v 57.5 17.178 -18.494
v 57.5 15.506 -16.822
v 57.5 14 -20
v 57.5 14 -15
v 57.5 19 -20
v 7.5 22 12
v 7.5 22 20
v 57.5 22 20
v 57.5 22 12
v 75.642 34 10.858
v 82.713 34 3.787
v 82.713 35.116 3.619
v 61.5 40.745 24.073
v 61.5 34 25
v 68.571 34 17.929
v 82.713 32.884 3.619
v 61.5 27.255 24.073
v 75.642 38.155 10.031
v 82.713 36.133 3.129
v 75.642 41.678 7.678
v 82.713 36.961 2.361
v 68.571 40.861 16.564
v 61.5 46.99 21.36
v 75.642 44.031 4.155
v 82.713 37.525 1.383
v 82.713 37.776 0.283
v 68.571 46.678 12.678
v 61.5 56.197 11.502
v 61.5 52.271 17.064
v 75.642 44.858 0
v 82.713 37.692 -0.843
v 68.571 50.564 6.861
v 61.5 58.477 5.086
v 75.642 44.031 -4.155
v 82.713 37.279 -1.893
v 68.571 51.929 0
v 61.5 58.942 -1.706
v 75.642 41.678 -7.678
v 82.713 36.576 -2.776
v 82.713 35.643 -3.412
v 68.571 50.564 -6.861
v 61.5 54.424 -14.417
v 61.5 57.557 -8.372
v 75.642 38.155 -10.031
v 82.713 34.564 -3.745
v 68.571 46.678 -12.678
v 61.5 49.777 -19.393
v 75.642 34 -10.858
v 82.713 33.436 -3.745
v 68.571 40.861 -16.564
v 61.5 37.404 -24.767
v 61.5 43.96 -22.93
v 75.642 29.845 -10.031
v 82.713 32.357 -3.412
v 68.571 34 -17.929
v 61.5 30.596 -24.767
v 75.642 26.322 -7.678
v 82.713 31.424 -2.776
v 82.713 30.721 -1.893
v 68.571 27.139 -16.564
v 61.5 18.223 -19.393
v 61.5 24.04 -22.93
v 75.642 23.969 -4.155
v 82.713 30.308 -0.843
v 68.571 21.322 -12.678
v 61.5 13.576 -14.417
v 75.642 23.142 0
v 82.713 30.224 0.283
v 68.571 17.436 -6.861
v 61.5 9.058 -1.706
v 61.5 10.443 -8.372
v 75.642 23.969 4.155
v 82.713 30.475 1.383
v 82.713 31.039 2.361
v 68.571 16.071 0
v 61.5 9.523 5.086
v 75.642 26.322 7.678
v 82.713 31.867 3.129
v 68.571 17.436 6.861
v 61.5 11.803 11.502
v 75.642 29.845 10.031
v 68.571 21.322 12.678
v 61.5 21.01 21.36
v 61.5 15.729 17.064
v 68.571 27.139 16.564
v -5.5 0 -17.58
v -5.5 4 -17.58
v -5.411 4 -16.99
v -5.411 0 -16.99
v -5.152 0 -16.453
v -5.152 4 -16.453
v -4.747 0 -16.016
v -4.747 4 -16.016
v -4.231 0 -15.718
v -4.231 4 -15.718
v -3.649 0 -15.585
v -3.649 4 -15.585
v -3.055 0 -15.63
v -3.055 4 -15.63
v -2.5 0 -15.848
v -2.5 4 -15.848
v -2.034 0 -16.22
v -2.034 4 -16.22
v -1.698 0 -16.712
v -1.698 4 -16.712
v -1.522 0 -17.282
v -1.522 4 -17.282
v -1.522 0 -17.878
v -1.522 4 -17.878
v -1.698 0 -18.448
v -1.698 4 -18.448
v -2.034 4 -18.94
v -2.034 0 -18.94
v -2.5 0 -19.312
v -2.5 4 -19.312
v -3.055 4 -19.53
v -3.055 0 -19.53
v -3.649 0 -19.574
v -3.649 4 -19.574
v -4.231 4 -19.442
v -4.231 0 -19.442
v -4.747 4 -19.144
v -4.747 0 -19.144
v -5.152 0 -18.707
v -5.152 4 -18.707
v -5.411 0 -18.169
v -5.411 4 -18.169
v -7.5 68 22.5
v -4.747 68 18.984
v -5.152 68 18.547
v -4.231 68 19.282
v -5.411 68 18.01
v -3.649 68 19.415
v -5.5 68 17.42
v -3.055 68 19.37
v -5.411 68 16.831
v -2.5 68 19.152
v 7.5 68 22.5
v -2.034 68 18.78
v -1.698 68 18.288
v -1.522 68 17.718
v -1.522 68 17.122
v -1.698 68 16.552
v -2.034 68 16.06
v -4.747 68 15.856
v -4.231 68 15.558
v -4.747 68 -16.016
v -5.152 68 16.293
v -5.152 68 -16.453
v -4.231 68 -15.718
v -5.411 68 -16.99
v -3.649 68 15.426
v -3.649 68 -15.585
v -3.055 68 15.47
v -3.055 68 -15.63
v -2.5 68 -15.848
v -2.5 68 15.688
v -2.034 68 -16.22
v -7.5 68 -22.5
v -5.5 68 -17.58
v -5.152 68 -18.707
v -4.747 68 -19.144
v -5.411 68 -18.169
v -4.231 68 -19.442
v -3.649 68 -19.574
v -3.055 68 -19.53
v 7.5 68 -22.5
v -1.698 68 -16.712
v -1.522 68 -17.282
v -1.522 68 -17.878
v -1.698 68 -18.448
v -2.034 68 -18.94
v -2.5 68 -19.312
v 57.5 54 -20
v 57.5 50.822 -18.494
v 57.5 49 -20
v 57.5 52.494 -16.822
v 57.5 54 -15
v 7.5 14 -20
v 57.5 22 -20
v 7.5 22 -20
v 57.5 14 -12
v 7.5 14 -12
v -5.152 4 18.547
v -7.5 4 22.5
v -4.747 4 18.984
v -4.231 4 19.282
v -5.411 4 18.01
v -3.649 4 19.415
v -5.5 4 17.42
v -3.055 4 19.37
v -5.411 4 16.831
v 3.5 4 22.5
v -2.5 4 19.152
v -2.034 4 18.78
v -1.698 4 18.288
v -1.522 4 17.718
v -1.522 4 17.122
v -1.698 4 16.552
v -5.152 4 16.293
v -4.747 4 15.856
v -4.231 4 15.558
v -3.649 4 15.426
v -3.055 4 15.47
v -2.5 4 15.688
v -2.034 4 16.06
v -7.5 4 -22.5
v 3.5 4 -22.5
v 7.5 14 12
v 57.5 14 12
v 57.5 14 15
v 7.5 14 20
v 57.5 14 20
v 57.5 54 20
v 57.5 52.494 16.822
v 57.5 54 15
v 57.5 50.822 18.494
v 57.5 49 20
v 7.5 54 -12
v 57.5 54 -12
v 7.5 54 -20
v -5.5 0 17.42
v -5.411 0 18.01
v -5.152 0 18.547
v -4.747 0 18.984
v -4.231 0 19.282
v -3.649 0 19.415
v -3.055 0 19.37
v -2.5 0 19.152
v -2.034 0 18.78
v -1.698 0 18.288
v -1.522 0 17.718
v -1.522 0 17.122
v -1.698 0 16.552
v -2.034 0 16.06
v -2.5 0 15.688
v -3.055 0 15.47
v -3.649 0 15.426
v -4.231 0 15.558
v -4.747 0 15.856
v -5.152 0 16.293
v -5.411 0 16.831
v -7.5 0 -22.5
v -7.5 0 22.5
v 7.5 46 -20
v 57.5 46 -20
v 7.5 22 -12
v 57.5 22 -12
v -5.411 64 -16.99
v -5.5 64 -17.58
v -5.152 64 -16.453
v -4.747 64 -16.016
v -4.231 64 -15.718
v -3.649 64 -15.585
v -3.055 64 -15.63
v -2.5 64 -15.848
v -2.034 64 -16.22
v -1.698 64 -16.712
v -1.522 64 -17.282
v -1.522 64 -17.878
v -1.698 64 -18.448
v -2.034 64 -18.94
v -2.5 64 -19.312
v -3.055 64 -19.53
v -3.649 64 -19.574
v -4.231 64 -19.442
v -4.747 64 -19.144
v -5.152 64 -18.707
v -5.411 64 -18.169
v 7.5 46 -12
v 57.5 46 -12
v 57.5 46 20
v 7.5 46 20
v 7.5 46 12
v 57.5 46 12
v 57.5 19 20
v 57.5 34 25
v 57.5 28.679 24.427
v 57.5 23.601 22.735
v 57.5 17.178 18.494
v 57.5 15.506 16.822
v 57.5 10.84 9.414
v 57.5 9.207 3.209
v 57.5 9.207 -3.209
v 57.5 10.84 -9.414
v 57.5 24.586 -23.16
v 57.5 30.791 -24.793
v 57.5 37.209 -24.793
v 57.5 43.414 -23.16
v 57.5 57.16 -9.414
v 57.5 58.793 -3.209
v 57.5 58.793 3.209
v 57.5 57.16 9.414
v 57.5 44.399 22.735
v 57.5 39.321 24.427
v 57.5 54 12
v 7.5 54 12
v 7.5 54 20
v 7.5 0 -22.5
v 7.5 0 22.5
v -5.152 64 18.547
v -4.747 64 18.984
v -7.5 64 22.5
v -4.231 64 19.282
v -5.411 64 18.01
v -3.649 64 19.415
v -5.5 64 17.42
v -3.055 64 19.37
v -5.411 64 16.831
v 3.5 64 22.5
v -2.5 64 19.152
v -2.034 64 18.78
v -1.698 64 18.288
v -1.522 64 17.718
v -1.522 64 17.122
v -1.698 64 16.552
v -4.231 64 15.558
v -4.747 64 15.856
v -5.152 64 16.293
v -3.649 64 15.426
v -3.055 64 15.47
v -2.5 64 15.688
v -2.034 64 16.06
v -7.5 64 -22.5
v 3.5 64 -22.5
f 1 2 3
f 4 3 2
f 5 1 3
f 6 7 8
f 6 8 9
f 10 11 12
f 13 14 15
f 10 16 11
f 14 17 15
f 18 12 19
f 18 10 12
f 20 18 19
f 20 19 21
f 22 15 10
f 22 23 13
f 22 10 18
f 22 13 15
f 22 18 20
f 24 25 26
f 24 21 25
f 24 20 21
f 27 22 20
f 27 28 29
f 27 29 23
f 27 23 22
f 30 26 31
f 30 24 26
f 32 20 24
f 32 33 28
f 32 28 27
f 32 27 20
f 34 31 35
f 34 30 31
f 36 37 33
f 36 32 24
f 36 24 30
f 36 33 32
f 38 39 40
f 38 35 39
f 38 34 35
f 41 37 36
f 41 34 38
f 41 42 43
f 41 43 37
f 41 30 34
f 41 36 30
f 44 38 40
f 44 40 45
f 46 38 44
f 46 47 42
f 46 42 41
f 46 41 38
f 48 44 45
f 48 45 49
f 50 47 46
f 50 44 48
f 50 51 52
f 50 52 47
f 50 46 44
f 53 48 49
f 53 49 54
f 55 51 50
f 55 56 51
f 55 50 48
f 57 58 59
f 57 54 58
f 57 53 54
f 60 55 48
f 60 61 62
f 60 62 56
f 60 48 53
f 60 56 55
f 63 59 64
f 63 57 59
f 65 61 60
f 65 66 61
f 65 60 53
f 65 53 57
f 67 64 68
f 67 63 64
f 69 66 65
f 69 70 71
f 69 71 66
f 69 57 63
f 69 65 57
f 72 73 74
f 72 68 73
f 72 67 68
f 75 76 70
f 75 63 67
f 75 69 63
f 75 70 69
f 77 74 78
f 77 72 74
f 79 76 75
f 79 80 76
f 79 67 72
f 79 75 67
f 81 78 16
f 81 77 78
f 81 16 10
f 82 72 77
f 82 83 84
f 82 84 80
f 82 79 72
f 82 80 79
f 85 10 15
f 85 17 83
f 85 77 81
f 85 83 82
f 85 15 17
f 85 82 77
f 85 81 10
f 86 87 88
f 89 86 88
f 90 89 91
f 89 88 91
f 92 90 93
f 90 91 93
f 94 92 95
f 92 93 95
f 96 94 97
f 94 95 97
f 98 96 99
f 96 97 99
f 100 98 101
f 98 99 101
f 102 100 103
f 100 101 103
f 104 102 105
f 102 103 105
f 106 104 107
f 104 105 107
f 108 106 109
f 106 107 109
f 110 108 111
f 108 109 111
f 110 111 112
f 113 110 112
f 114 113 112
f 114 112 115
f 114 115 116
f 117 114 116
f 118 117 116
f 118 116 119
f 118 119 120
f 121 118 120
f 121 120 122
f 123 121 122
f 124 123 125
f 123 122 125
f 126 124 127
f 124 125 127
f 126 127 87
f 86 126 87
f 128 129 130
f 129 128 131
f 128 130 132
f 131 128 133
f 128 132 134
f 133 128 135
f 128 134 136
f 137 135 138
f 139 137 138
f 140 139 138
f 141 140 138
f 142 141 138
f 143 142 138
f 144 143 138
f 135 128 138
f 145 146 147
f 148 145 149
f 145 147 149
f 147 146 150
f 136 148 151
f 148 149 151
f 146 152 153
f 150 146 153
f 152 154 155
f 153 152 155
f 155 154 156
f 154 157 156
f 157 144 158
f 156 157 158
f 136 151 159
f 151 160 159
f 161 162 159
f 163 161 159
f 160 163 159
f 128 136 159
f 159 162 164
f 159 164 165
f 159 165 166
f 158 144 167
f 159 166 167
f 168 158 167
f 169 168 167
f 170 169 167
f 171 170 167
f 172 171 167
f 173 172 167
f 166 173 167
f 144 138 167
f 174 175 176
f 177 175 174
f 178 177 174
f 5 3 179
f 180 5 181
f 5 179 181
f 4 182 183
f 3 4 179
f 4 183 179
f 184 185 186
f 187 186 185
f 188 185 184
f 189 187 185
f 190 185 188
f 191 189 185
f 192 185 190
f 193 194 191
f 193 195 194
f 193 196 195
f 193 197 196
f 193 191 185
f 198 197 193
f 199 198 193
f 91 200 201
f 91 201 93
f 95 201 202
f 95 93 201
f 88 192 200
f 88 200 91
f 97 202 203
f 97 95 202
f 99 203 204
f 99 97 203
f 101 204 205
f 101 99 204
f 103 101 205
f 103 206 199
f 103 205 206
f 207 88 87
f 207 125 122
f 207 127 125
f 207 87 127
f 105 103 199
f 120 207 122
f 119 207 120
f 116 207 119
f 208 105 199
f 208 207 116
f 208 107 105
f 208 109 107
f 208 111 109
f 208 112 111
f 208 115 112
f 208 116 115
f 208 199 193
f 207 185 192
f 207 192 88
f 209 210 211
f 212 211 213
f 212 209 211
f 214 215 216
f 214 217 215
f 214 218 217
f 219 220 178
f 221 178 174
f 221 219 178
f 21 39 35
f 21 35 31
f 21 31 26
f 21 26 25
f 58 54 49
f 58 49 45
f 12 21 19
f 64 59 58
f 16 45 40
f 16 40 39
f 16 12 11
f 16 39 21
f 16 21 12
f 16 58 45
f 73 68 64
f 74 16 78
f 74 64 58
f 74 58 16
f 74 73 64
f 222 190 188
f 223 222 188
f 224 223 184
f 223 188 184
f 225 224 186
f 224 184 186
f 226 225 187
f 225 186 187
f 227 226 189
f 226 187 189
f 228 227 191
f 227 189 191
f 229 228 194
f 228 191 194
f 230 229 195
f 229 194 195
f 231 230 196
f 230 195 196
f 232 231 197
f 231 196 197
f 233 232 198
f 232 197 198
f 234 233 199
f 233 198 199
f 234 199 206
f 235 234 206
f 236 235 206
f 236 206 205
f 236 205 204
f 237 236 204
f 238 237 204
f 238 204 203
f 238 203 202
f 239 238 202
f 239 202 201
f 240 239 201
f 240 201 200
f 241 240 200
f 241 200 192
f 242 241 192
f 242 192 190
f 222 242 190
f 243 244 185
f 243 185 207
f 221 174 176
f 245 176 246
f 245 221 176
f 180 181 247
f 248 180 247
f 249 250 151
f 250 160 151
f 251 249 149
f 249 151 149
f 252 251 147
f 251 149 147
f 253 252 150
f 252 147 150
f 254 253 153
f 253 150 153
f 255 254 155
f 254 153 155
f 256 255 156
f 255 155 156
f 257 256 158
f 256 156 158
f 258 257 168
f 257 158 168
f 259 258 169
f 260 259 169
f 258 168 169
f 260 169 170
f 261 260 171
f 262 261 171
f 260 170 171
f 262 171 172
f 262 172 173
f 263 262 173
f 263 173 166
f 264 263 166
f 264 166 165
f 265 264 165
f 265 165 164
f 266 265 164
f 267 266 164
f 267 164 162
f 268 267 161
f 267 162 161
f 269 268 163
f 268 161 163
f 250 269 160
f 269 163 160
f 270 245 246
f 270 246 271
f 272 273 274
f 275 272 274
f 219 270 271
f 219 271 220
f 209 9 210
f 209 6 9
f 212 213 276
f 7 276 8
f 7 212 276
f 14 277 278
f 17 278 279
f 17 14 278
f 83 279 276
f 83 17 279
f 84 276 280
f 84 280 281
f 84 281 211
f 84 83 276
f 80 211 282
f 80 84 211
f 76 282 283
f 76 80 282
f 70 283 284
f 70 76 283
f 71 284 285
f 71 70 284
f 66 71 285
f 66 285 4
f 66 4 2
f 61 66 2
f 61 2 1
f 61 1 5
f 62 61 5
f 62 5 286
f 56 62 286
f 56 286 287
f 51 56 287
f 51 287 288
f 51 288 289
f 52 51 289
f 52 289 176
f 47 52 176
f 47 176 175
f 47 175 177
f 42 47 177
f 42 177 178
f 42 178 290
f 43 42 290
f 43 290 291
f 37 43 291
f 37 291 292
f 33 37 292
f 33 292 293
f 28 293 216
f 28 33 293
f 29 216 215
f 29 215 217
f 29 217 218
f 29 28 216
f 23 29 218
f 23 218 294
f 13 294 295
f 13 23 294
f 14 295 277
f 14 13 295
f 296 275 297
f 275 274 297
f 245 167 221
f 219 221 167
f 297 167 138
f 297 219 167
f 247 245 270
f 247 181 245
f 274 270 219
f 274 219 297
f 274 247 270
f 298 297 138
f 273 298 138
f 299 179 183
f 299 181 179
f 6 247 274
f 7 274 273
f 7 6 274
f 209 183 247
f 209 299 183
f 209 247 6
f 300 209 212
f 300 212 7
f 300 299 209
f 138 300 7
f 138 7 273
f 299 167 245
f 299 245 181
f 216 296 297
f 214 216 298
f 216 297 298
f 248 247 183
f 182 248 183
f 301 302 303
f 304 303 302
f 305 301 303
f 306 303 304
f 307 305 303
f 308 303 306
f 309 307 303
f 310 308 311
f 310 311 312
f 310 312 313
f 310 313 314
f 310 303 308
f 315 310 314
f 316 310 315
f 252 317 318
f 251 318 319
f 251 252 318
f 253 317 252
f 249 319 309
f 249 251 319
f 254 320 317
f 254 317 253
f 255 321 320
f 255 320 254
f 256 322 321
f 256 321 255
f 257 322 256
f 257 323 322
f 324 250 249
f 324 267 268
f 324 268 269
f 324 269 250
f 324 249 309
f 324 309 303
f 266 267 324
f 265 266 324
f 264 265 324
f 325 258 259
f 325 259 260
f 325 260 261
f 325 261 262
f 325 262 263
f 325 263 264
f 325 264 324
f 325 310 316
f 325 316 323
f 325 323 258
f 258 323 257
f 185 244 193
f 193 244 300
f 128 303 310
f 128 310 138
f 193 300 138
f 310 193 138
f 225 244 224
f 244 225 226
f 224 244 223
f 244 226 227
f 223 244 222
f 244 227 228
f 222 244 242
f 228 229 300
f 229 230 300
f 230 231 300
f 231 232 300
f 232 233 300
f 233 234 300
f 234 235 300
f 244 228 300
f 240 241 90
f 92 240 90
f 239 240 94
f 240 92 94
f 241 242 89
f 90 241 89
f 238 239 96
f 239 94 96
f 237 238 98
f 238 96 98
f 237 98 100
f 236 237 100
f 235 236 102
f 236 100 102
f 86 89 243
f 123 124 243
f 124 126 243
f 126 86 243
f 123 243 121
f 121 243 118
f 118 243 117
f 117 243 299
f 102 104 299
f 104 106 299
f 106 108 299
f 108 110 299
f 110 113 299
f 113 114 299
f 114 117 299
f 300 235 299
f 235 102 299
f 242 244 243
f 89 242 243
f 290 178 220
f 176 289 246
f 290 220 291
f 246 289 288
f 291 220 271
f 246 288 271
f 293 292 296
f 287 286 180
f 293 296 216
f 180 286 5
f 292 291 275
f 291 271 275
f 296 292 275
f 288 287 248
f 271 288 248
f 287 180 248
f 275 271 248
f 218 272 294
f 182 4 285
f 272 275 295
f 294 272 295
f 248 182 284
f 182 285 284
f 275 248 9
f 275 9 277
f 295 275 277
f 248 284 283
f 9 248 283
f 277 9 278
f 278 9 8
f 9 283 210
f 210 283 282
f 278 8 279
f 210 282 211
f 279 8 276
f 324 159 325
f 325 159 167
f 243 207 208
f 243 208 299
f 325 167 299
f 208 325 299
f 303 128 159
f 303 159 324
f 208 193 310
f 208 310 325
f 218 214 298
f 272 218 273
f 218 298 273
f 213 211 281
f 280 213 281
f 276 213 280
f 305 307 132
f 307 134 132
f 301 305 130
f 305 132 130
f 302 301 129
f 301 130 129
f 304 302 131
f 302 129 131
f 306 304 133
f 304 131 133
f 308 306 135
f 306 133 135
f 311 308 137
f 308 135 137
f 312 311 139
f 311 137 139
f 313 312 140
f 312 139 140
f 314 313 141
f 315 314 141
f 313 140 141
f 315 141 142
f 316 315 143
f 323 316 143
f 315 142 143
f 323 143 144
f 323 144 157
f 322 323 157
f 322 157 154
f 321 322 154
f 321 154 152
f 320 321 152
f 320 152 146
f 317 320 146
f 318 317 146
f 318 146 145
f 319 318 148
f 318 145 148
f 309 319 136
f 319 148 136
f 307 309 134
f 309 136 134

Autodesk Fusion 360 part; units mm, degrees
sketch "Sketch1" plane through (0, 0, 0) normal (0, 1, 0) x (1, 0, 0)
  line L0 (7.5, -22.5) -> (-7.5, -22.5)
  line L1 (-7.5, -22.5) -> (-7.5, 22.5)
  line L2 (-7.5, 22.5) -> (7.5, 22.5)
  line L3 (7.5, 22.5) -> (7.5, -22.5)
  line L4 (7.5, -22.5) -> (-7.5, 22.5) construction
  line L5 (-7.5, -22.5) -> (7.5, 22.5) construction
  dimension "d1" = 45
  dimension "d2" = 15
extrude "Extrude1" add sketch "Sketch1" along normal blind 4
sketch "Sketch2" plane through (0, 4, 0) normal (0, 1, 0) x (-1, 0, 0)
  line L0 (-7.5, -22.5) -> (7.5, -22.5)
  line L1 (7.5, -22.5) -> (7.5, 22.5)
  line L2 (7.5, 22.5) -> (-7.5, 22.5)
  line L3 (-7.5, 22.5) -> (-7.5, -22.5)
  line L4 (-7.5, 22.5) -> (-3.5, 22.5)
  line L5 (-3.5, 22.5) -> (-3.5, -22.5)
  line L6 (-3.5, -22.5) -> (-7.5, -22.5)
  line L7 (-7.5, -22.5) -> (-7.5, 22.5)
  dimension "d9" = 4
extrude "Extrude2" add sketch "Sketch2" along normal blind 64 contours L0 L2 L3 L4 L5 L6 L7
sketch "Sketch3" plane through (3.5, 0, 0) normal (-1, 0, 0) x (0, -1, 0)
  line L0 (-4, -22.5) -> (-4, 22.5)
  line L1 (-4, 22.5) -> (-68, 22.5)
  line L2 (-68, 22.5) -> (-68, -22.5)
  line L3 (-68, -22.5) -> (-4, -22.5)
  line L4 (-68, 22.5) -> (-64, 22.5)
  line L5 (-64, 22.5) -> (-64, -22.5)
  line L6 (-64, -22.5) -> (-68, -22.5)
  line L7 (-68, -22.5) -> (-68, 22.5)
  dimension "d12" = 4
extrude "Extrude3" add sketch "Sketch3" along normal blind 11 contours L1 L2 L3 L4 L5 L6 L7
sketch "Sketch4" plane through (3.5, 0, 0) normal (-1, 0, 0) x (0, -1, 0)
  line L0 (-64, 22.5) -> (-64, -22.5)
  line L1 (-64, -22.5) -> (-4, -22.5)
  line L2 (-4, -22.5) -> (-4, 22.5)
  line L3 (-4, 22.5) -> (-64, 22.5)
  line L4 (-60, 22.5) -> (-56, 22.5)
  line L5 (-56, 22.5) -> (-56, -22.5)
  line L6 (-56, -22.5) -> (-60, -22.5)
  line L7 (-60, -22.5) -> (-60, 22.5)
  line L8 (-34, -22.5) -> (-34, 22.5) construction
  line L9 (-8, 22.5) -> (-12, 22.5)
  line L10 (-8, -22.5) -> (-8, 22.5)
  line L11 (-12, 22.5) -> (-12, -22.5)
  line L12 (-12, -22.5) -> (-8, -22.5)
  dimension "d15" = 4
  dimension "d16" = 4
sketch "Sketch5" plane through (0, 68, 0) normal (0, 1, 0) x (-1, 0, 0)
  line L0 (-7.5, -22.5) -> (7.5, -22.5)
  line L1 (7.5, -22.5) -> (7.5, 22.5)
  line L2 (7.5, 22.5) -> (-7.5, 22.5)
  line L3 (-7.5, 22.5) -> (-7.5, -22.5)
  circle A0 centre (3.5, 17.4201) radius 2
  circle A1 centre (3.5, -17.5799) radius 2
  line L4 (3.5, -17.5799) -> (3.5, 17.4201) construction
  point P0 (3.5, -0.0799)
  dimension "d19" = 4
  dimension "d20" = 4
  dimension "d21" = 35
  dimension "d22" = 4
extrude "Extrude5" cut sketch "Sketch5" against normal through all contours A0 | A1
ref_plane "WorkPlane1" through (0, 34, 0) normal (0, 1, 0) x (0, 0, 1)
sketch "Sketch7" plane through (7.5, 0, 0) normal (1, 0, 0) x (0, 1, 0)
  line L0 (0, 22.5) -> (0, -22.5)
  line L1 (0, -22.5) -> (68, -22.5)
  line L2 (68, -22.5) -> (68, 22.5)
  line L3 (68, 22.5) -> (0, 22.5)
  line L4 (54, 20) -> (14, 20) construction
  line L5 (14, 20) -> (14, -20) construction
  line L6 (14, -20) -> (54, -20) construction
  line L7 (54, -20) -> (54, 20) construction
  line L8 (54, 20) -> (14, -20) construction
  line L9 (14, 20) -> (54, -20) construction
  line L10 (34, 22.5) -> (34, -22.5) construction
  line L11 (0, 0) -> (68, 0) construction
  line L12 (14, 20) -> (22, 20)
  line L13 (22, 20) -> (22, 12)
  line L14 (22, 12) -> (14, 12)
  line L15 (14, 12) -> (14, 20)
  line L16 (46, 12) -> (54, 12)
  line L17 (54, 12) -> (54, 20)
  line L18 (54, 20) -> (46, 20)
  line L19 (46, 20) -> (46, 12)
  line L20 (22, -12) -> (14, -12)
  line L21 (22, -20) -> (22, -12)
  line L22 (14, -20) -> (22, -20)
  line L23 (14, -12) -> (14, -20)
  line L24 (46, -20) -> (46, -12)
  line L25 (54, -20) -> (46, -20)
  line L26 (54, -12) -> (54, -20)
  line L27 (46, -12) -> (54, -12)
  point P0 (34, 0)
  dimension "d32" = 40
  dimension "d33" = 40
  dimension "d34" = 8
extrude "Extrude6" add sketch "Sketch7" along normal blind 50 contours L12 L13 L14 L15 | L16 L17 L18 L19 | L20 L21 L22 L23 | L24 L25 L26 L27
sketch "Sketch8" plane through (0, 34, 0) normal (0, 1, 0) x (1, 0, 0)
  line L0 (57.5, -20) -> (57.5, -12)
  line L1 (0, 0) -> (67.5, 0) construction
  line L2 (57.5, -25) -> (61.5, -25)
  line L3 (61.5, -25) -> (82.7132, -3.7868)
  line L4 (57.5, -25) -> (57.5, 0)
  line L5 (82.7132, -3.7868) -> (82.7132, 0)
  line L6 (82.7132, 0) -> (57.5, 0)
  point P0 (57.5, 0)
  dimension "d39" = 4
  dimension "d40" = 135
  dimension "d41" = 30
revolve "Revolve2" add sketch "Sketch8" angle 360 about axis through (0, 34, 0) along (1, 0, 0)
equation "d10 = 56 mm + 8 mm"
equation "d24 = -( 68 / 2 ) * 1 mm"
